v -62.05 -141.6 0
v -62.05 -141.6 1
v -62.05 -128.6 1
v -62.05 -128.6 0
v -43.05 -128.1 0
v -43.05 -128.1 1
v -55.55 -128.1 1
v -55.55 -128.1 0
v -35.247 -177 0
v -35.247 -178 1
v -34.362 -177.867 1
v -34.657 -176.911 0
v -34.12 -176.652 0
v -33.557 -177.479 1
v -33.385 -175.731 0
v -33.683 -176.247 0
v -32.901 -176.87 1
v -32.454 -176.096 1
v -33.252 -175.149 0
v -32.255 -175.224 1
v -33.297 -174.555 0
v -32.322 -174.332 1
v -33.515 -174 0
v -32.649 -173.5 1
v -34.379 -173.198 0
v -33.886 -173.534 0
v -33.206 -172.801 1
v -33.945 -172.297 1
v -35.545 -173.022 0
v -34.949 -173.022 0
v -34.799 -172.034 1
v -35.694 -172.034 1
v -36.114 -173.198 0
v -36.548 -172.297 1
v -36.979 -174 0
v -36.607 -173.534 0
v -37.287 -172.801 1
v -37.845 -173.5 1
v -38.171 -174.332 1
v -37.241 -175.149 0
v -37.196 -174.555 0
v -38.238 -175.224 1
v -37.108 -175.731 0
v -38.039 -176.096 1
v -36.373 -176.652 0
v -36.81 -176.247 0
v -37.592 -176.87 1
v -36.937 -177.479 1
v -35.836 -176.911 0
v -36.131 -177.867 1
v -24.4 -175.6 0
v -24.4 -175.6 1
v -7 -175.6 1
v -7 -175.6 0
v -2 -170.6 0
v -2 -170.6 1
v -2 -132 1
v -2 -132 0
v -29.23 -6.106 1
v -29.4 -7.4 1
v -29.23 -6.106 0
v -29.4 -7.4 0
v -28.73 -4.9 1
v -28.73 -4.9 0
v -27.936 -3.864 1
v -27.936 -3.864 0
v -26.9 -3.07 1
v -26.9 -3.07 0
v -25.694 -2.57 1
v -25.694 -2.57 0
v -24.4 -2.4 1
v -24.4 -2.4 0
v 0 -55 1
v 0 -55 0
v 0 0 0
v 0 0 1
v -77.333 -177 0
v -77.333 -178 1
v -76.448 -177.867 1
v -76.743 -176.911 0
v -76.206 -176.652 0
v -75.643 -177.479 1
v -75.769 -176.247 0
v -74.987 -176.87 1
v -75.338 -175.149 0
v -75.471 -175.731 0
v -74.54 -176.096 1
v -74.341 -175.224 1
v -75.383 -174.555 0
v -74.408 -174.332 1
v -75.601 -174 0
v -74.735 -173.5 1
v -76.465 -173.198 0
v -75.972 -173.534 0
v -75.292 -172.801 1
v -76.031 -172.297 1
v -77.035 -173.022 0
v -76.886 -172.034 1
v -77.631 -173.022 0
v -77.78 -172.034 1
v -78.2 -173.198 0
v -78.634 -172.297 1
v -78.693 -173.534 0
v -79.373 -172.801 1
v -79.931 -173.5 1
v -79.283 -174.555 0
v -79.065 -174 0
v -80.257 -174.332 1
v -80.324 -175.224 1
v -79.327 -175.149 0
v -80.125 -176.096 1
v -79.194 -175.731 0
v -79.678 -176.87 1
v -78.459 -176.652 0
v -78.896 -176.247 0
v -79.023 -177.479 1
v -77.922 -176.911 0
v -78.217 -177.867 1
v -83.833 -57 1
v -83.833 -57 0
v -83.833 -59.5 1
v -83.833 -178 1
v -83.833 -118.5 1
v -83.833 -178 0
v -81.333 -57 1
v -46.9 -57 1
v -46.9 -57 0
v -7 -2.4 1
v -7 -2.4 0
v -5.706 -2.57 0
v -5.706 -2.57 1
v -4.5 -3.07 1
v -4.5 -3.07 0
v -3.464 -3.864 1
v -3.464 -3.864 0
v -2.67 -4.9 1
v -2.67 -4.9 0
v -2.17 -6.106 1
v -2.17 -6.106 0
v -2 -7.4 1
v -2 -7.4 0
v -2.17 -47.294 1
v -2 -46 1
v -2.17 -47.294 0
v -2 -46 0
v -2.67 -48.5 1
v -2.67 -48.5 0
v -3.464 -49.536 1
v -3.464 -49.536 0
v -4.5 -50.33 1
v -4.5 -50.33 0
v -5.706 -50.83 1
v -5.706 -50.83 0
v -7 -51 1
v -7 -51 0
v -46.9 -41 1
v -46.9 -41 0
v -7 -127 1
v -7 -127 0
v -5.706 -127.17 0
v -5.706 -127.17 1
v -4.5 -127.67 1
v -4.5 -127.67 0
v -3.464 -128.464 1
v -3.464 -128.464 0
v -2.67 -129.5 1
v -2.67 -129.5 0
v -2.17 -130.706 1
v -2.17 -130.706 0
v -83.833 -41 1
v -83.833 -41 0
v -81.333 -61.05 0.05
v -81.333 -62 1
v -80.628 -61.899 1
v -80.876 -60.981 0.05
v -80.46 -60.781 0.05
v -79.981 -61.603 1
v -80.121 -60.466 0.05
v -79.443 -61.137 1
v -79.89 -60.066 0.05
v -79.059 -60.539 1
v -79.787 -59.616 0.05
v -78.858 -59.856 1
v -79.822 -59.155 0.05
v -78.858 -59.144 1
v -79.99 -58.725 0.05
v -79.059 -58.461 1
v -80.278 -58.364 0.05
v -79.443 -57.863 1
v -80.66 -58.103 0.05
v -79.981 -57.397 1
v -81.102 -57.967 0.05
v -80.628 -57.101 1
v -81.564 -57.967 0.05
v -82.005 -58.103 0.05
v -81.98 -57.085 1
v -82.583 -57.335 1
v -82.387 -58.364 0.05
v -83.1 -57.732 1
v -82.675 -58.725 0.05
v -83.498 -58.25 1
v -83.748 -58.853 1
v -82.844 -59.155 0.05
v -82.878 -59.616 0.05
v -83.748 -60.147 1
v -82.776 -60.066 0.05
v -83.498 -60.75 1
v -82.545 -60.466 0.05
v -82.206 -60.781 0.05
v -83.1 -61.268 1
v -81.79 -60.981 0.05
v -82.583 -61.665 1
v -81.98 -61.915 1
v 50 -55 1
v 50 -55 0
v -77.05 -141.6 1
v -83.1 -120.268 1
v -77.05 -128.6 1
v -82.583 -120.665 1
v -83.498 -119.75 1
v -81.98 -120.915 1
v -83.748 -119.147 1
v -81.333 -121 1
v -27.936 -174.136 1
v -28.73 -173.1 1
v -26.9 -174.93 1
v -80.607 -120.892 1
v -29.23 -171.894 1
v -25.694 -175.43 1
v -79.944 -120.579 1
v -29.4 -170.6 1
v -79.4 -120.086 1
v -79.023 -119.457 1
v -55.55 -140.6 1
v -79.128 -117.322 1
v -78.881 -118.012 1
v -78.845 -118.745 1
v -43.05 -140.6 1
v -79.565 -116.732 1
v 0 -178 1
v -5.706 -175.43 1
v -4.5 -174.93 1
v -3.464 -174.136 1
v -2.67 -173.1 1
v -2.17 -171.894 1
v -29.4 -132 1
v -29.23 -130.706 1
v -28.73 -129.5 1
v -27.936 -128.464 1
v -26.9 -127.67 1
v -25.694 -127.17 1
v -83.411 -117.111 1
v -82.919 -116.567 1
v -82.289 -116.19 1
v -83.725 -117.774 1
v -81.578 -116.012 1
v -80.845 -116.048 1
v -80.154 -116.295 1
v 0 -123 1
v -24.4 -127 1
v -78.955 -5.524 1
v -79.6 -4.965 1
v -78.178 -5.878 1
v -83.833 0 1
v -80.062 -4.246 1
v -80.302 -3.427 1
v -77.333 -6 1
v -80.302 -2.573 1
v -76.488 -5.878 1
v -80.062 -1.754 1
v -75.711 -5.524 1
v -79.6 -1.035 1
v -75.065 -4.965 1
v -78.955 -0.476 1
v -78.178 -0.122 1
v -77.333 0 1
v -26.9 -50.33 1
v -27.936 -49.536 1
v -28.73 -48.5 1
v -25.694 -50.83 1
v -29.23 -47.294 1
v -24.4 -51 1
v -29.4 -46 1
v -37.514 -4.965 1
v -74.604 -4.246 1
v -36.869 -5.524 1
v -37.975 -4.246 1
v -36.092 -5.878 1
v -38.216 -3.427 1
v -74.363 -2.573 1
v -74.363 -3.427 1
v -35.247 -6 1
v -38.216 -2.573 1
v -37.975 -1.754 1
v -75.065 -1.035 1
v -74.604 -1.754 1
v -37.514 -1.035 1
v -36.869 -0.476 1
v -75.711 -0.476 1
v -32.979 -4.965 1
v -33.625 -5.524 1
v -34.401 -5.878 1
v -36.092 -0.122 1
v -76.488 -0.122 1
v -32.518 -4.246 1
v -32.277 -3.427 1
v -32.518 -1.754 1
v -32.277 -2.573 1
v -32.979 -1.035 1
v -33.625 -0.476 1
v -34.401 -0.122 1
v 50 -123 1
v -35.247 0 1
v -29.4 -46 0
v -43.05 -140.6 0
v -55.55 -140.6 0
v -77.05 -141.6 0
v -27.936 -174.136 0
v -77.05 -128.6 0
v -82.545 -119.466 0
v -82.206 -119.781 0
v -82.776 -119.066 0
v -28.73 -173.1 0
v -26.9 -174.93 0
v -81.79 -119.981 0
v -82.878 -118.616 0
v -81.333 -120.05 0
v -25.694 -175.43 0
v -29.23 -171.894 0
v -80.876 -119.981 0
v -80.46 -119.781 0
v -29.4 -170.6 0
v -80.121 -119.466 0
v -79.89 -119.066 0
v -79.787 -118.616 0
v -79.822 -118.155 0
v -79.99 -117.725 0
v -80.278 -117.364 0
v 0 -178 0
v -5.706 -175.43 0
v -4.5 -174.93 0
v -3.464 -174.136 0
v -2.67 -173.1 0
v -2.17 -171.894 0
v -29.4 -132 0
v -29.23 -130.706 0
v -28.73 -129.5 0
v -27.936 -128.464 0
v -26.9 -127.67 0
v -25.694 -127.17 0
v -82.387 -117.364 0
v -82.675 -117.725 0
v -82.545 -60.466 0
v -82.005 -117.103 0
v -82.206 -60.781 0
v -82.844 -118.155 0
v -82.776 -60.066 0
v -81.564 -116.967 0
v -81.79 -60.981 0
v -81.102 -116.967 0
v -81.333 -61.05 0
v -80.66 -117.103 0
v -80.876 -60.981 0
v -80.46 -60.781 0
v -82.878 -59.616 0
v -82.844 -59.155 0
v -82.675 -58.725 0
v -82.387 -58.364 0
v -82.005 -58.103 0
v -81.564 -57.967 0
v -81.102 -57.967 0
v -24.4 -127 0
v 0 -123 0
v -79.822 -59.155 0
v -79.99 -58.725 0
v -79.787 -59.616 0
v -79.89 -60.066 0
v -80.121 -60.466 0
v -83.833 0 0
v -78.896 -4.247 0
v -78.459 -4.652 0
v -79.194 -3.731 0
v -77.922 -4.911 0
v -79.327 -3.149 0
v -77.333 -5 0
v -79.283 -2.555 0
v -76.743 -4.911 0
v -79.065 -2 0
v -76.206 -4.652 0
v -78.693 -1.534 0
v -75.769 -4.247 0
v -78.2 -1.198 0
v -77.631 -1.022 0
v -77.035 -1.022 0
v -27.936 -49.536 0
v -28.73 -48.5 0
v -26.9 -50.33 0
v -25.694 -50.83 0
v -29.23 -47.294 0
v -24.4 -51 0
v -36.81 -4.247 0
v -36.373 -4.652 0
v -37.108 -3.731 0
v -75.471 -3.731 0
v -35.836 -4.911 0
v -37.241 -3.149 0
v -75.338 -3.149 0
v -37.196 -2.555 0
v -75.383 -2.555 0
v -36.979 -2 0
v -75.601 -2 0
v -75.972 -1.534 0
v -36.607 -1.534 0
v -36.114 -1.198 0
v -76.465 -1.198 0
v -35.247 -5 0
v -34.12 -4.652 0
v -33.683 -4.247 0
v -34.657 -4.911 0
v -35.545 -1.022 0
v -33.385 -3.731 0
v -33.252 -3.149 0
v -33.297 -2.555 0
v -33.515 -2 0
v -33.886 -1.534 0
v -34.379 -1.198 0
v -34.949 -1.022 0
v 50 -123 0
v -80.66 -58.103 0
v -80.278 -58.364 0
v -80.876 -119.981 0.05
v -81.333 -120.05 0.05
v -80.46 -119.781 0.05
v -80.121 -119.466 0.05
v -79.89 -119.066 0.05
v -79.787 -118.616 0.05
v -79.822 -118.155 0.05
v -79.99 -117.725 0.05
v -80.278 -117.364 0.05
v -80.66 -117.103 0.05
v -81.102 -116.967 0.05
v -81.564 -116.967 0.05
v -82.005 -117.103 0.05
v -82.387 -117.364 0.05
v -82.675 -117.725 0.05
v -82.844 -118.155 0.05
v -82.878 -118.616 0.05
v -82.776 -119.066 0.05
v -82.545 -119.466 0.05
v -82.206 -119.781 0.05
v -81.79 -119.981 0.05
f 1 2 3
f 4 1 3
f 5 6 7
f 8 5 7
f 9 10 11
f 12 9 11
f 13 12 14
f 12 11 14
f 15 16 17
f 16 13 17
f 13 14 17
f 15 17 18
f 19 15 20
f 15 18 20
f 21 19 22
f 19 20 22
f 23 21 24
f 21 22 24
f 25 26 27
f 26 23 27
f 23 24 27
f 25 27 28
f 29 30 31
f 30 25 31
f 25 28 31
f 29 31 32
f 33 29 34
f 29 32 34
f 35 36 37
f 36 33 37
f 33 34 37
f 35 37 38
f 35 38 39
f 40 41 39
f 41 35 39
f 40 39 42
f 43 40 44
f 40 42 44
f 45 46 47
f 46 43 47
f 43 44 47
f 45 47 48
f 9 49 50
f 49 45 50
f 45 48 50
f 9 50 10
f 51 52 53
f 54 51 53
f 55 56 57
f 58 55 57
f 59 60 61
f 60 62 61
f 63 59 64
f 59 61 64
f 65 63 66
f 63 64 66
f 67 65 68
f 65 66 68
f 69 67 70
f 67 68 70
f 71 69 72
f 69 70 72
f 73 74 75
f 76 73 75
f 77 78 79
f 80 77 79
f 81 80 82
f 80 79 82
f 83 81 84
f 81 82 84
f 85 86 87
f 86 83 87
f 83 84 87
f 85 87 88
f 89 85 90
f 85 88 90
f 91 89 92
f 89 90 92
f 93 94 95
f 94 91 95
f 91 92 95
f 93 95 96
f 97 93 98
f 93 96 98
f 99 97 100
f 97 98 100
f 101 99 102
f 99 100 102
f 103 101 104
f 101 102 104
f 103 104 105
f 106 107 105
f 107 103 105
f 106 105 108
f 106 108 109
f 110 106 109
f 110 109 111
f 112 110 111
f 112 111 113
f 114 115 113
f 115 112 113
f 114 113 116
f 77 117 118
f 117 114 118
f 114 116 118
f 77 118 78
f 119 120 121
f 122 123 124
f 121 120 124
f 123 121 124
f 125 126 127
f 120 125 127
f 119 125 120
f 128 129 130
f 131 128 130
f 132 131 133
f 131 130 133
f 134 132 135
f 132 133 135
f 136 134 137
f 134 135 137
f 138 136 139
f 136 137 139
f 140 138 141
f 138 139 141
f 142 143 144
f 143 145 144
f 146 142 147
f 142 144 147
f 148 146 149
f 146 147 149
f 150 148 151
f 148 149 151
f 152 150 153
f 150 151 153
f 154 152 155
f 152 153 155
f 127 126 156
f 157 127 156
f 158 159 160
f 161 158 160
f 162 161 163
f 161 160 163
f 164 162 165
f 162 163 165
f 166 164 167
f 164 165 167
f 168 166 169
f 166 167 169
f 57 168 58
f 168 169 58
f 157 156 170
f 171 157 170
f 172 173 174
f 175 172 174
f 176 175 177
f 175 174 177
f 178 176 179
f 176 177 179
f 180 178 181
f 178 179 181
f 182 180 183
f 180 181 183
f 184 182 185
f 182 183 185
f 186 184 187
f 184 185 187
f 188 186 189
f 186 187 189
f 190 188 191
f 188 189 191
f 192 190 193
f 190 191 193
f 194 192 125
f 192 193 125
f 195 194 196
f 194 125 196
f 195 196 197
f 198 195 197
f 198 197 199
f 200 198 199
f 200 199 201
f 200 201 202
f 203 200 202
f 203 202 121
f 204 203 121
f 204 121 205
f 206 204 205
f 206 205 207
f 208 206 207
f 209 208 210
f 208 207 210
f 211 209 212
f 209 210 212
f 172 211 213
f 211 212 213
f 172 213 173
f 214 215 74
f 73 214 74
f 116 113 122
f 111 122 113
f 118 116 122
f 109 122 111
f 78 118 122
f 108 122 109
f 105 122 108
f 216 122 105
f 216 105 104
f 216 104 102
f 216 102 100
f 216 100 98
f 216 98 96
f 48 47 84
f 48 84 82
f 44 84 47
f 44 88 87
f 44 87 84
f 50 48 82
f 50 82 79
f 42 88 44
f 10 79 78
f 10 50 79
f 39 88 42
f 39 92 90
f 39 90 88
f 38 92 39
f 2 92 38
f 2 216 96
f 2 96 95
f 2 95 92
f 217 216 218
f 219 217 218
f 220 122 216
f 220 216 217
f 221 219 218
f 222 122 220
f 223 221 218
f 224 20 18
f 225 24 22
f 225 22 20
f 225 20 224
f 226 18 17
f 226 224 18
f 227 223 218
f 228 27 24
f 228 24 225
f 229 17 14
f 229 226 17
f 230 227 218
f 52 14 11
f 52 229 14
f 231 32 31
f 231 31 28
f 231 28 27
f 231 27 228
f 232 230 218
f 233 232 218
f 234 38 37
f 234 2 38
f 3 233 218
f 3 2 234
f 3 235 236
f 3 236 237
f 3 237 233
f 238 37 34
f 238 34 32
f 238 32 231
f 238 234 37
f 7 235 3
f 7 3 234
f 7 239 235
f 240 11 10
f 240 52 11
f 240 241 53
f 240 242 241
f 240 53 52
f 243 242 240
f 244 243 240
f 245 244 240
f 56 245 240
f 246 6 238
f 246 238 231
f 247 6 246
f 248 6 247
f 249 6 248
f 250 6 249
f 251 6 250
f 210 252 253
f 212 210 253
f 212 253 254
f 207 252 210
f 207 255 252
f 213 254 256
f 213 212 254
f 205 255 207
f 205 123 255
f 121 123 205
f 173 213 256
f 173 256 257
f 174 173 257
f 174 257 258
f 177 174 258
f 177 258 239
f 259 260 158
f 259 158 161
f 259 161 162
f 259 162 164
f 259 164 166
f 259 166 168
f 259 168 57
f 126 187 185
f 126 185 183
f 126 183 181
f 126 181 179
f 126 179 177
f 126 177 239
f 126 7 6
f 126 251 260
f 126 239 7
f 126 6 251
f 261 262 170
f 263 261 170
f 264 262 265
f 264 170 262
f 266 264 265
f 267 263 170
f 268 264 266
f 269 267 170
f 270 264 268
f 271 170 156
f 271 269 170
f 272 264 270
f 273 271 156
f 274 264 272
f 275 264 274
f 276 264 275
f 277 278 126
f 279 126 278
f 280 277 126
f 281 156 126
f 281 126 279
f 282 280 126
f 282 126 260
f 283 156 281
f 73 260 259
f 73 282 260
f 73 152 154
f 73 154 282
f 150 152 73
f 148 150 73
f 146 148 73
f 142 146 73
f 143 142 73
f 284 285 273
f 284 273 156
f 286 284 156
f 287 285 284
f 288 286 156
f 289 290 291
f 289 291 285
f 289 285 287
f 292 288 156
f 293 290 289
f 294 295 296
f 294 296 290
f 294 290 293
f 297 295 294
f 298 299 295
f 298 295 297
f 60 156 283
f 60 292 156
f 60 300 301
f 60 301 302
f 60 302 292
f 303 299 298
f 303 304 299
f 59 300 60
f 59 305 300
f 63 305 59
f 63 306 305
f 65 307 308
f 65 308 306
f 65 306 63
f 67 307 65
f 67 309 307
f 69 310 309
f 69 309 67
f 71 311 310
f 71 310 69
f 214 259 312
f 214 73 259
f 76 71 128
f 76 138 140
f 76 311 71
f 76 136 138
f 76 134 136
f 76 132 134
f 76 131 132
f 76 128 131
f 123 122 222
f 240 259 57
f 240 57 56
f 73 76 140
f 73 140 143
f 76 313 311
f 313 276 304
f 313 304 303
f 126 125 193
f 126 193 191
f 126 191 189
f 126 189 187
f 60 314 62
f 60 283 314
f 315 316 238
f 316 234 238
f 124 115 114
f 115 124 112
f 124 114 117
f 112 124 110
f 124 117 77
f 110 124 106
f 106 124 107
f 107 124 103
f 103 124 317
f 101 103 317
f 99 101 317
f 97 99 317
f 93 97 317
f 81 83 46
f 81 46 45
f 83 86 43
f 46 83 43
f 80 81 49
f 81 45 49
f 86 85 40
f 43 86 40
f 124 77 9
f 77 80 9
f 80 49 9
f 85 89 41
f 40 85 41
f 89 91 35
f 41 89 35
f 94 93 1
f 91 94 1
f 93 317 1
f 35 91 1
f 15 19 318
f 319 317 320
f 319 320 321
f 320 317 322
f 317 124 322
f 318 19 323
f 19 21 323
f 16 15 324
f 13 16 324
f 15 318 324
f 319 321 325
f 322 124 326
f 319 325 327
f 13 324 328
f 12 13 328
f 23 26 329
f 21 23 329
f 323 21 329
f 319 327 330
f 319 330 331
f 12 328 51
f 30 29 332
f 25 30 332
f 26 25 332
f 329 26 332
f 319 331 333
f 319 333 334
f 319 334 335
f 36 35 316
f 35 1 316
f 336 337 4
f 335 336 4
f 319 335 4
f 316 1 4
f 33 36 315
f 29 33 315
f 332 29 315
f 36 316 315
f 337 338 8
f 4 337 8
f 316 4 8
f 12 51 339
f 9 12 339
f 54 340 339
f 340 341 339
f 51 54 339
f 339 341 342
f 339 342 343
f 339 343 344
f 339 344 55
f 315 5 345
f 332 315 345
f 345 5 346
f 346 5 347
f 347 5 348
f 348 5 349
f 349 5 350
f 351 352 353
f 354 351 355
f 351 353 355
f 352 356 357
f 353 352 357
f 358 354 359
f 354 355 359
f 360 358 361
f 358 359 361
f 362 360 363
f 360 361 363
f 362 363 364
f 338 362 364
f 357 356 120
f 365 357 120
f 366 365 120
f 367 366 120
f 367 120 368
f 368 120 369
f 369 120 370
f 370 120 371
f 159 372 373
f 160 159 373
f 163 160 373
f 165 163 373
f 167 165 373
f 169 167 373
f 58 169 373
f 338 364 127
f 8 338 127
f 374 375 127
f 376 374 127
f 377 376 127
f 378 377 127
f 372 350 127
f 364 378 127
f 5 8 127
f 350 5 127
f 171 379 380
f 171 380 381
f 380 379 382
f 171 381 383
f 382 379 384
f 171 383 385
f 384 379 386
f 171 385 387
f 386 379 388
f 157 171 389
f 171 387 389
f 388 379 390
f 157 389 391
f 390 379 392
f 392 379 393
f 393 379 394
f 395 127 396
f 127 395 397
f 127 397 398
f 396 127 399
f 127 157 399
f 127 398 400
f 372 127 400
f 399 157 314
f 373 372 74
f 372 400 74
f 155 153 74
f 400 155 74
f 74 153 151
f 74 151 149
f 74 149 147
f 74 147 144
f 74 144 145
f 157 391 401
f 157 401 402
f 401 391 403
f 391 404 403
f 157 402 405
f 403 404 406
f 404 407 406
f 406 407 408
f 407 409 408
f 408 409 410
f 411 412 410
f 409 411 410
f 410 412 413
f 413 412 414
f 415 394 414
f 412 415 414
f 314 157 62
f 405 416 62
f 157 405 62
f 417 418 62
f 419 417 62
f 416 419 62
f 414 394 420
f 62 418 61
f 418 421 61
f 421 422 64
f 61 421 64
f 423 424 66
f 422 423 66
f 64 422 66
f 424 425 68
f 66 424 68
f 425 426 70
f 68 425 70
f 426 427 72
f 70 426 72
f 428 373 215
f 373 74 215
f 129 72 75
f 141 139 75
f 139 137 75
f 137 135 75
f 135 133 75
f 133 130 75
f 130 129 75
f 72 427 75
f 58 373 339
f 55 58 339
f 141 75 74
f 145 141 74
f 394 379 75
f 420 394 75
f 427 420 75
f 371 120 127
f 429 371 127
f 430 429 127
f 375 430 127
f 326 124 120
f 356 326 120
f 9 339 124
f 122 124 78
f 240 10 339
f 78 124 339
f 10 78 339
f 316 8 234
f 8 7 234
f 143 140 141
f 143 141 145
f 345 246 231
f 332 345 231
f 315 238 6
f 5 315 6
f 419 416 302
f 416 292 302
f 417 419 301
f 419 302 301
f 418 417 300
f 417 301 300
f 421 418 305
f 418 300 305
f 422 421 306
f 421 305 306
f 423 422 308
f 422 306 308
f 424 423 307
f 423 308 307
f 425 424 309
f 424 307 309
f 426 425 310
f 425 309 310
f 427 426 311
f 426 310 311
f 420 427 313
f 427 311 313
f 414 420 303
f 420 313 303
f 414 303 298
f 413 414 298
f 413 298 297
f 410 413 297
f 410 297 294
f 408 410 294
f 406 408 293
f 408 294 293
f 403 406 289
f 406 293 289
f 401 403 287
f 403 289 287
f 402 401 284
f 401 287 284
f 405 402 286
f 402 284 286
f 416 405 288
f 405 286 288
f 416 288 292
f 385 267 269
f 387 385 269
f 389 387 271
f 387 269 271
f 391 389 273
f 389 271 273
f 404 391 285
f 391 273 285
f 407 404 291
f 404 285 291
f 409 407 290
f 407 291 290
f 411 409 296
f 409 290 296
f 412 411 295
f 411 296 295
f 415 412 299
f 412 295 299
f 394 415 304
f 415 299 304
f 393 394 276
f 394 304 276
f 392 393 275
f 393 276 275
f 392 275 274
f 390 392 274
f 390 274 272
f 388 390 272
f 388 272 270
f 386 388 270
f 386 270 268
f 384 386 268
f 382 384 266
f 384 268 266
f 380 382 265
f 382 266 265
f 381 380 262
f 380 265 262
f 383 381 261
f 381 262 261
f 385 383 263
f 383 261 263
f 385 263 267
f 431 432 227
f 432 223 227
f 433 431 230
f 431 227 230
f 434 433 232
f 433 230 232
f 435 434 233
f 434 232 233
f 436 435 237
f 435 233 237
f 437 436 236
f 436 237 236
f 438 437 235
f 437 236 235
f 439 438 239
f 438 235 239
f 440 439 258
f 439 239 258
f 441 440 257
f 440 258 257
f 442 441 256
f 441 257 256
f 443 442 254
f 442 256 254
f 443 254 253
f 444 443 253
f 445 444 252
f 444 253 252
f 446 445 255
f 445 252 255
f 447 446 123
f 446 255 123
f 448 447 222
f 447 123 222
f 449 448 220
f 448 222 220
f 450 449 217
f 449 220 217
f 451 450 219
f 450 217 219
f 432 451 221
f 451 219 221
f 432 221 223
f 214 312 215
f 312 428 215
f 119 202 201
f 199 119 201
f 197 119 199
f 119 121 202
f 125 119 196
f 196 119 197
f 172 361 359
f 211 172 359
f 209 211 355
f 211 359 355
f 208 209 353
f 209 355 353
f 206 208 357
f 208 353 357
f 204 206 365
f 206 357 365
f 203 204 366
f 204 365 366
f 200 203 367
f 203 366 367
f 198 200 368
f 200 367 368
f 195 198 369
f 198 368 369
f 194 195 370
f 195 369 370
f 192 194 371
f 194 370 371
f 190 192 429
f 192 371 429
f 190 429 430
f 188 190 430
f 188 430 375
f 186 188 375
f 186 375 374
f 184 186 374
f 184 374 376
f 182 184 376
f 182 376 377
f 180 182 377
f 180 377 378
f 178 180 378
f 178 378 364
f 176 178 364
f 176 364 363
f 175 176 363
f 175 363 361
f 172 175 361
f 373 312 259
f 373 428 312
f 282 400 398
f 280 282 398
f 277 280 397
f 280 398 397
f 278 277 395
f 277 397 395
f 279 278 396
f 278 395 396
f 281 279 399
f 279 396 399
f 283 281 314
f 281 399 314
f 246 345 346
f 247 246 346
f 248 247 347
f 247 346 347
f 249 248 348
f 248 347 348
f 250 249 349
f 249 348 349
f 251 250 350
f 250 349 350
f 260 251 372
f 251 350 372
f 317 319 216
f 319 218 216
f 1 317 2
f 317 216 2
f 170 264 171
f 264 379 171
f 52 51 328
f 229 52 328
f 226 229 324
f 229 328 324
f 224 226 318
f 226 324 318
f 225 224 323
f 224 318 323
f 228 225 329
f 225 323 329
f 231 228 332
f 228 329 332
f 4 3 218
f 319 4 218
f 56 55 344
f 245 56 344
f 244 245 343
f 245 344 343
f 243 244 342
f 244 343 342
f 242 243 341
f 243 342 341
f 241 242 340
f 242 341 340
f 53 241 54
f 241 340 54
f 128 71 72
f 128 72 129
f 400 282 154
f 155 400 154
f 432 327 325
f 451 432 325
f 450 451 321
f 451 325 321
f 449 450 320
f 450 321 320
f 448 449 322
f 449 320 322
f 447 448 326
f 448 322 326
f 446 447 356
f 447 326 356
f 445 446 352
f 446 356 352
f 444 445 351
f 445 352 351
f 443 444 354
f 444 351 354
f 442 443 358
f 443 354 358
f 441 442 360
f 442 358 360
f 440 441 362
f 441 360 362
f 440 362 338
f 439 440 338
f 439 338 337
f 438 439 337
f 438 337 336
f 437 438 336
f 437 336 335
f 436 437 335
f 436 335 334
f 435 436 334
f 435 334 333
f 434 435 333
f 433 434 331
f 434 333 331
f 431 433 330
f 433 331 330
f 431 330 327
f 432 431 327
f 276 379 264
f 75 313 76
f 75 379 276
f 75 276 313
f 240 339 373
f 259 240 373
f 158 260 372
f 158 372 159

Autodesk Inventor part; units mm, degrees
ref_plane "YZ Plane" through (0, 0, 0) normal (1, 0, 0) x (0, 1, 0)
ref_plane "XZ Plane" through (0, 0, 0) normal (0, 1, 0) x (-1, 0, 0)
ref_plane "XY Plane" through (0, 0, 0) normal (0, 0, 1) x (1, 0, 0)
ref_plane "Work Plane1" through (0, 0, 0) normal (0, 0, 1) x (1, 0, 0)
sketch "Sketch1" plane through (0, 0, 0) normal (0, 0, 1) x (1, 0, 0)
  line L0 (-42, -2) -> (-73.5901, -2) projected
  arc A0 (-39.1716, -4) -> (-42, -2) centre (-42, -5) ccw projected
  arc A1 (-39.1716, -4) -> (-36.3431, -6) centre (-36.3431, -3) ccw projected
  line L1 (-36, -6) -> (-36.3431, -6) projected
  arc A2 (-36, -6) -> (-33.1612, -3.9702) centre (-36, -3) ccw projected
  line L2 (-33, -2.5071) -> (-33, -2) projected
  line L3 (-32, -1) -> (0, -1) projected
  line L4 (0, 0) -> (0, -1) projected
  line L5 (-83.8327, 0) -> (0, 0) projected
  line L6 (-83.8327, 0) -> (-83.8327, -6) projected
  line L7 (-77.8327, -6) -> (-83.8327, -6) projected
  line L8 (-41.75, -176) -> (-73.5901, -176) projected
  line L9 (-77.8327, -172) -> (-83.8327, -172) projected
  line L10 (-83.8327, -178) -> (-83.8327, -172) projected
  line L11 (-83.8327, -178) -> (0, -178) projected
  line L12 (0, -178) -> (0, -177) projected
  line L13 (-31.75, -177) -> (0, -177) projected
  line L14 (-32.75, -175) -> (-32.75, -176) projected
  arc A3 (-32.75, -175) -> (-35.75, -172) centre (-35.75, -175) ccw projected
  line L15 (-35.75, -172) -> (-36.0931, -172) projected
  arc A4 (-36.0931, -172) -> (-38.9216, -174) centre (-36.0931, -175) ccw projected
  arc A5 (-41.75, -176) -> (-38.9216, -174) centre (-41.75, -173) ccw projected
  line L16 (0, 0) -> (-83.8327, 0)
  line L17 (-83.8327, 0) -> (-83.8327, -178)
  line L18 (-83.8327, -178) -> (0, -178)
  line L19 (0, -178) -> (0, 0)
  circle A6 centre (9.325, -58.5) radius 3 projected
  line L20 (-30.35, -55) -> (-30.35, -62) projected
  line L21 (-30.35, -62) -> (50, -62) projected
  line L22 (50, -62) -> (50, -55) projected
  line L23 (50, -55) -> (-30.35, -55) projected
  circle A7 centre (-81.3327, -118.5) radius 1.75 projected
  line L24 (50, -123) -> (-83.8327, -123) projected
  line L25 (50, -116) -> (50, -123) projected
  line L26 (-30.55, -116) -> (50, -116) projected
  line L27 (-30.55, -116) -> (-30.55, -121) projected
  line L28 (-30.55, -121) -> (-46.95, -121) projected
  line L29 (-46.95, -121) -> (-46.95, -116) projected
  line L30 (-83.8327, -116) -> (-46.95, -116) projected
  line L31 (-83.8327, -123) -> (-83.8327, -116) projected
  circle A8 centre (9.325, -119.5) radius 3 projected
  line L32 (0, -55) -> (50, -55)
  line L33 (50, -55) -> (50, -123)
  line L34 (50, -123) -> (0, -123)
  line L35 (0, -123) -> (0, -55)
  arc A9 (-32, -1) -> (-33, -2) centre (-32, -2) ccw projected
  circle A10 centre (-80.8327, -3) radius 2.3 projected
  arc A11 (-73.5901, -2) -> (-77.8327, -6) centre (-73.5901, -6.25) ccw projected
  arc A12 (-33, -2.5071) -> (-33.1612, -3.9702) centre (-35.2466, -3) ccw projected
  arc A13 (-32.75, -176) -> (-31.75, -177) centre (-31.75, -176) ccw projected
  circle A14 centre (-35.2466, -175) radius 2.3 projected
  circle A15 centre (-80.8327, -175) radius 2.3 projected
  arc A16 (-77.8327, -172) -> (-73.5901, -176) centre (-73.5901, -171.75) ccw projected
  point P0 (0, -123)
extrude "Extrusion1" add sketch "Sketch1" along normal blind 1 contours A0 A1 L1 A2 A12 L2 A9 L3 L19 L23 L20 L21 L26 L27 L28 L29 L30 L17 L7 A11 L0 | L0 A11 L7 L6 L5 L4 L3 A9 L2 A12 A2 L1 A1 A0 | L30 L29 L28 L27 L26 L19 L24 L17 | L24 L19 L13 A13 L14 A3 L15 A4 A5 L8 A16 L9 L17 | L9 A16 L8 A5 A4 L15 A3 L14 A13 L13 L12 L11 L10 | L19 L26 L25 L24 | L23 L22 L21 L19 | L19 L21 L20 L23 | L19 L21 L33 L26 | A6 | A7 | A8 | A10 | A14 | A15
sketch "Sketch3" plane through (0, 0, 1) normal (0, 0, 1) x (1, 0, 0)
  circle A0 centre (-81.3327, -59.5) radius 1.75 projected
  circle A1 centre (-81.3327, -118.5) radius 1.75 projected
  circle A2 centre (-77.3327, -3) radius 2.3 projected
  circle A3 centre (-35.2466, -3) radius 2.3 projected
  circle A4 centre (-35.2466, -175) radius 2.3 projected
  circle A5 centre (-77.3327, -175) radius 2.3 projected
  point P0 (0, 0)
hole "Hole1" at (-35.2466, -3, 1) at (-77.3327, -3, 1) at (-77.3327, -175, 1) at (-35.2466, -175, 1) direction (0, 0, -1) diameter 3.6 end through all countersink diameter 6 countersink angle 90 clearance for "Countersunk Flat Head Screw ISO 2009/7046" size "M3" standard "ISO"
sketch "Sketch4" plane through (0, 0, 1) normal (0, 0, 1) x (1, 0, 0)
  circle A0 centre (-81.3327, -59.5) radius 1.75 projected
  circle A1 centre (-81.3327, -118.5) radius 1.75 projected
  point P0 (0, 0)
hole "Hole2" at (-81.3327, -59.5, 1) at (-81.3327, -118.5, 1) direction (0, 0, -1) diameter 3.1 end through all countersink diameter 5 countersink angle 90 clearance for "Countersunk Flat Head Screw ISO 2009/7046" size "M2.5" standard "ISO"
sketch "Sketch5" plane through (0, 0, 1) normal (0, 0, 1) x (1, 0, 0)
  line L0 (-54.55, -139.6) -> (-54.55, -129.1) projected
  line L1 (-44.05, -129.1) -> (-54.55, -129.1) projected
  line L2 (-44.05, -129.1) -> (-44.05, -139.6) projected
  line L3 (-54.55, -139.6) -> (-44.05, -139.6) projected
  line L4 (-76.05, -140.6) -> (-76.05, -129.6) projected
  line L5 (-76.05, -129.6) -> (-63.05, -129.6) projected
  line L6 (-63.05, -129.6) -> (-63.05, -140.6) projected
  line L7 (-63.05, -140.6) -> (-76.05, -140.6) projected
  line L8 (-77.05, -123) -> (-77.05, -141.6) projected
  line L9 (-77.05, -141.6) -> (-35.75, -141.6) projected
  line L10 (-35.75, -141.6) -> (-35.75, -123) projected
  line L11 (-35.75, -123) -> (-77.05, -123) projected
  circle A0 centre (-73.6, -126.3) radius 1.5 projected
  circle A1 centre (-39.2, -126.3) radius 1.5 projected
  line L12 (-68.4939, -42.5) -> (-68.4939, -56.8) projected
  line L13 (-48.1, -42.4061) -> (-68.4, -42.4061) projected
  line L14 (-47.9, -56.9) -> (-47.9, -42.4) projected
  line L15 (-68.4, -56.8939) -> (-48.1, -56.8939) projected
  line L16 (-68.8327, -42) -> (-68.8327, -57) projected
  line L17 (-83.8327, -42) -> (-68.8327, -42) projected
  line L18 (-83.8327, -57) -> (-83.8327, -42) projected
  line L19 (-68.8327, -57) -> (-83.8327, -57) projected
  line L20 (-46.9, -41) -> (-83.8327, -41)
  line L21 (-83.8327, -41) -> (-83.8327, -57)
  line L22 (-83.8327, -57) -> (-46.9, -57)
  line L23 (-46.9, -57) -> (-46.9, -41)
  line L24 (50, -123) -> (50, -55) projected
  line L25 (50, -55) -> (0, -55) projected
  line L26 (0, -55) -> (0, 0) projected
  line L27 (0, 0) -> (-35.2466, 0) projected
  circle A2 centre (-35.2466, -3) radius 3 projected
  line L28 (-35.2466, 0) -> (-77.3327, 0) projected
  circle A3 centre (-77.3327, -3) radius 3 projected
  line L29 (-77.3327, 0) -> (-83.8327, 0) projected
  line L30 (-83.8327, 0) -> (-83.8327, -59.5) projected
  circle A4 centre (-81.3327, -59.5) radius 2.5 projected
  line L31 (-83.8327, -59.5) -> (-83.8327, -118.5) projected
  circle A5 centre (-81.3327, -118.5) radius 2.5 projected
  line L32 (-83.8327, -118.5) -> (-83.8327, -178) projected
  line L33 (-83.8327, -178) -> (-77.3327, -178) projected
  circle A6 centre (-77.3327, -175) radius 3 projected
  line L34 (-77.3327, -178) -> (-35.2466, -178) projected
  circle A7 centre (-35.2466, -175) radius 3 projected
  line L35 (-35.2466, -178) -> (0, -178) projected
  line L36 (0, -178) -> (0, -123) projected
  line L37 (0, -123) -> (50, -123) projected
  line L38 (-43.05, -140.6) -> (-43.05, -128.1)
  line L39 (-43.05, -128.1) -> (-55.55, -128.1)
  line L40 (-55.55, -128.1) -> (-55.55, -140.6)
  line L41 (-55.55, -140.6) -> (-43.05, -140.6)
  line L42 (-62.05, -141.6) -> (-62.05, -128.6)
  line L43 (-62.05, -128.6) -> (-77.05, -128.6)
  line L44 (-77.05, -128.6) -> (-77.05, -141.6)
  line L45 (-77.05, -141.6) -> (-62.05, -141.6)
  line L46 (-30, -4.4) -> (-2, -4.4) projected
  line L47 (-2, -173.6) -> (-30, -173.6) projected
  line L48 (-2, -4.4) -> (-29.4, -4.4)
  line L49 (-29.4, -4.4) -> (-29.4, -2.4)
  line L50 (-29.4, -2.4) -> (-2, -2.4)
  line L51 (-2, -2.4) -> (-2, -4.4)
  line L52 (-2, -173.6) -> (-29.4, -173.6)
  line L53 (-29.4, -173.6) -> (-29.4, -175.6)
  line L54 (-29.4, -175.6) -> (-2, -175.6)
  line L55 (-2, -175.6) -> (-2, -173.6)
  line L56 (-30, -51) -> (-2, -51) projected
  line L57 (-30, -4.4) -> (-2, -4.4) projected
  line L58 (50, -123) -> (50, -55) projected
  line L59 (50, -89) -> (-83.8327, -89) construction
  line L60 (-83.8327, 0) -> (-83.8327, -178) projected
  line L61 (-2, -51) -> (-29.4, -51)
  line L62 (-29.4, -51) -> (-29.4, -2.4)
  line L63 (-29.4, -2.4) -> (-2, -2.4)
  line L64 (-2, -2.4) -> (-2, -51)
  line L65 (-30, -127) -> (-2, -127)
  line L66 (-30, -173.6) -> (-2, -173.6)
  line L67 (-29.4, -127) -> (-29.4, -175.6)
  line L68 (-29.4, -175.6) -> (-2, -175.6)
  line L69 (-2, -175.6) -> (-2, -127)
  point P0 (-29.4, -4.4)
  point P1 (-29.4, -127)
  point P2 (-2, -173.6)
  point P3 (-2, -4.4)
  point P4 (-29.4, -4.4)
  point P5 (-29.4, -51)
  dimension "d16" = 1
  dimension "d17" = 0
  dimension "d18" = 0
  dimension "d19" = 1
  dimension "d20" = 1
  dimension "d21" = 1
  dimension "d28" = 2
  dimension "d29" = 2
extrude "Extrusion2" cut sketch "Sketch5" against normal up to next contours L0 L1 L2 L3 | L4 L5 L6 L7 | L43 L42 L9 L8 | L17 L21 L20 L23 L22 L16 | L16 L19 L18 L17 | L41 L40 L39 L38 | L49 L50 L51 L46 | L46 L64 L56 L62 | L55 L54 L53 L47 | L47 L67 L65 L69
fillet "Fillet1" radius 5 8 edges at (-2, -2.4, 0.5) (-2, -51, 0.5) (-29.4, -51, 0.5) (-29.4, -2.4, 0.5) (-29.4, -127, 0.5) (-2, -175.6, 0.5) (-2, -127, 0.5) (-29.4, -175.6, 0.5)
properties part number "ceil" material "ABS Plastic"
